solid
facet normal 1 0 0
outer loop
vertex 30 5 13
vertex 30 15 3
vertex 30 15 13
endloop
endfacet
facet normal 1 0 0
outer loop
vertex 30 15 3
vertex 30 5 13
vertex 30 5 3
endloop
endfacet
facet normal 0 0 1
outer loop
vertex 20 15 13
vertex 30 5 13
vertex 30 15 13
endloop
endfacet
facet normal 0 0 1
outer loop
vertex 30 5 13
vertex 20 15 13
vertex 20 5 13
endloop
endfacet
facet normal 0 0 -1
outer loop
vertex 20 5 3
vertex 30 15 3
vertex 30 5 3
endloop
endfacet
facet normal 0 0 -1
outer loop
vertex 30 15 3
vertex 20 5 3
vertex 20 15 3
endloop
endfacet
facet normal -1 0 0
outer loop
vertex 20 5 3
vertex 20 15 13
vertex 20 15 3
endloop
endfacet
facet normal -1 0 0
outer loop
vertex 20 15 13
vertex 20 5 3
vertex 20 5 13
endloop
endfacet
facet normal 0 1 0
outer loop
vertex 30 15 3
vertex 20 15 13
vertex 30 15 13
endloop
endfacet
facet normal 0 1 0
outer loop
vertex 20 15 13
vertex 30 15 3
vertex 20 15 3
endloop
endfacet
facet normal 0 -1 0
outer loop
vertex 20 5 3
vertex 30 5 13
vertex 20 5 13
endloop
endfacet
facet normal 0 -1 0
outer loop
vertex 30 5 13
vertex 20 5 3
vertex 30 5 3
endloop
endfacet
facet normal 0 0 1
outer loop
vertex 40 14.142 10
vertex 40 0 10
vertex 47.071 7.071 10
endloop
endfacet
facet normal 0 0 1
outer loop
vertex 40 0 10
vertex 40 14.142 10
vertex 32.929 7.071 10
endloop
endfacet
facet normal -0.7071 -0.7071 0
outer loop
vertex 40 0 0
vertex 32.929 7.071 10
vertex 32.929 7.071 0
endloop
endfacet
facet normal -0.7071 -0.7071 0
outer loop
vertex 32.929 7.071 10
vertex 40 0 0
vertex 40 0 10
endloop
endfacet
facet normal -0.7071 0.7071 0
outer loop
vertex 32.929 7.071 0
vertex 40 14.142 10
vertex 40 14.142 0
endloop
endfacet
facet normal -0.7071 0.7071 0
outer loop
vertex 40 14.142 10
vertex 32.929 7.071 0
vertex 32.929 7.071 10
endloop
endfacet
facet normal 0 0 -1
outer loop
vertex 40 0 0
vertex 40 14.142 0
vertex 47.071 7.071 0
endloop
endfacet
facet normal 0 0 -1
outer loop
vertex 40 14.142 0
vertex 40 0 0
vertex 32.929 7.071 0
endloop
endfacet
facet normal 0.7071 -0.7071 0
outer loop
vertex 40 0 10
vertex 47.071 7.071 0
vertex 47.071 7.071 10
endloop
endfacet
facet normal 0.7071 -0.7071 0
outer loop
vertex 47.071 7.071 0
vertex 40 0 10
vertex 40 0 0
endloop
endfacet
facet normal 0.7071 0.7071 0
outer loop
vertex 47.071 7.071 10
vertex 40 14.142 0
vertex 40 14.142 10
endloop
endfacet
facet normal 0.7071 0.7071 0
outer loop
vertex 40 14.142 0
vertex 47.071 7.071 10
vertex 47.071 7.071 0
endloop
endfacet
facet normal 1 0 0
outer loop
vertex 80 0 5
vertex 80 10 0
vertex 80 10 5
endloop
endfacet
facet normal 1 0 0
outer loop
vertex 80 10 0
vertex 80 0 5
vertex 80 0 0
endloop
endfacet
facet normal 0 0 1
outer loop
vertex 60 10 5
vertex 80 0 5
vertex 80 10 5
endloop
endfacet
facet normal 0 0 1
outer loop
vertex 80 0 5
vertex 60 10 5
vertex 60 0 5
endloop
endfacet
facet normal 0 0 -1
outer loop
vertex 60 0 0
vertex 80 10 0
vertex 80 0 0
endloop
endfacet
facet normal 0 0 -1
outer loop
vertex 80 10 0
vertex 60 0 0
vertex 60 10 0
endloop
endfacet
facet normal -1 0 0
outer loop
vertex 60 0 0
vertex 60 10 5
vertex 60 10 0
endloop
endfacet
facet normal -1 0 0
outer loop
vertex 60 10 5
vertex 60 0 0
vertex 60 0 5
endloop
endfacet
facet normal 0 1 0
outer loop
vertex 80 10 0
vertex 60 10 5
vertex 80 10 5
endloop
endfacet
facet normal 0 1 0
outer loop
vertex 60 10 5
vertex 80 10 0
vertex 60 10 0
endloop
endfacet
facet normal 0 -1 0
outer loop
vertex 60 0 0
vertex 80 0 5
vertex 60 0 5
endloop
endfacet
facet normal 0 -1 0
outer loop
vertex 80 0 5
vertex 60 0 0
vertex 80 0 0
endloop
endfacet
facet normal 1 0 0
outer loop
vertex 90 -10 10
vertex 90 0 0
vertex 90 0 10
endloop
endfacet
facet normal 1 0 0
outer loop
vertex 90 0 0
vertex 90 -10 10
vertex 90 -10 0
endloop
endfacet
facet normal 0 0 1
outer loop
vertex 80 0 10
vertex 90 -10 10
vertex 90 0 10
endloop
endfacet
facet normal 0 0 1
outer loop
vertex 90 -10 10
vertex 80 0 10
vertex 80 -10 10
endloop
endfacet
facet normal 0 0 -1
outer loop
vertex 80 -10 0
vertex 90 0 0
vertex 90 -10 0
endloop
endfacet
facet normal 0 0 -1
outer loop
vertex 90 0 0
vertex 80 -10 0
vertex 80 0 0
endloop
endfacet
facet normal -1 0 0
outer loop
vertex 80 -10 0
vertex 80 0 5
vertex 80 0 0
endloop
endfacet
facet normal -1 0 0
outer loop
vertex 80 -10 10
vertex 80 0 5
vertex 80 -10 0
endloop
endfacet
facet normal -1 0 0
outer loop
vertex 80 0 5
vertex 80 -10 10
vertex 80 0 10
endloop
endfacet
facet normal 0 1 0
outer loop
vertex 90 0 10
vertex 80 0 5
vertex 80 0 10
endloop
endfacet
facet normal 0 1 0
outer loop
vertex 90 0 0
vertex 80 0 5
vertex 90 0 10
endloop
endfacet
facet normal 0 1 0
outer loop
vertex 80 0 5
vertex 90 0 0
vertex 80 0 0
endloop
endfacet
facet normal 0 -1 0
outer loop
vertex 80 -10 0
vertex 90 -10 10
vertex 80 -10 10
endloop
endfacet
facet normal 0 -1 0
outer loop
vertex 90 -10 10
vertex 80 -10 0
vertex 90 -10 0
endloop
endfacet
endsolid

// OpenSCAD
// TEST 04: Transforms — translate, rotate, scale, mirror
// Expected tree: each transform wraps a cube child.
// Check: editing a translate value in the card updates the code vector.
// Check: editing a rotate angle updates the code.

cube_s = 10;

// translate: cube moved to [20, 5, 3]
translate([20, 5, 3]) {
    cube([cube_s, cube_s, cube_s]);
}

// rotate: 45 degrees around Z
translate([40, 0, 0]) {
    rotate([0, 0, 45]) {
        cube([cube_s, cube_s, cube_s]);
    }
}

// scale: non-uniform stretch
translate([60, 0, 0]) {
    scale([2, 1, 0.5]) {
        cube([cube_s, cube_s, cube_s]);
    }
}

// mirror: flip across XZ plane (Y axis)
translate([80, 0, 0]) {
    mirror([0, 1, 0]) {
        cube([cube_s, cube_s, cube_s]);
    }
}
